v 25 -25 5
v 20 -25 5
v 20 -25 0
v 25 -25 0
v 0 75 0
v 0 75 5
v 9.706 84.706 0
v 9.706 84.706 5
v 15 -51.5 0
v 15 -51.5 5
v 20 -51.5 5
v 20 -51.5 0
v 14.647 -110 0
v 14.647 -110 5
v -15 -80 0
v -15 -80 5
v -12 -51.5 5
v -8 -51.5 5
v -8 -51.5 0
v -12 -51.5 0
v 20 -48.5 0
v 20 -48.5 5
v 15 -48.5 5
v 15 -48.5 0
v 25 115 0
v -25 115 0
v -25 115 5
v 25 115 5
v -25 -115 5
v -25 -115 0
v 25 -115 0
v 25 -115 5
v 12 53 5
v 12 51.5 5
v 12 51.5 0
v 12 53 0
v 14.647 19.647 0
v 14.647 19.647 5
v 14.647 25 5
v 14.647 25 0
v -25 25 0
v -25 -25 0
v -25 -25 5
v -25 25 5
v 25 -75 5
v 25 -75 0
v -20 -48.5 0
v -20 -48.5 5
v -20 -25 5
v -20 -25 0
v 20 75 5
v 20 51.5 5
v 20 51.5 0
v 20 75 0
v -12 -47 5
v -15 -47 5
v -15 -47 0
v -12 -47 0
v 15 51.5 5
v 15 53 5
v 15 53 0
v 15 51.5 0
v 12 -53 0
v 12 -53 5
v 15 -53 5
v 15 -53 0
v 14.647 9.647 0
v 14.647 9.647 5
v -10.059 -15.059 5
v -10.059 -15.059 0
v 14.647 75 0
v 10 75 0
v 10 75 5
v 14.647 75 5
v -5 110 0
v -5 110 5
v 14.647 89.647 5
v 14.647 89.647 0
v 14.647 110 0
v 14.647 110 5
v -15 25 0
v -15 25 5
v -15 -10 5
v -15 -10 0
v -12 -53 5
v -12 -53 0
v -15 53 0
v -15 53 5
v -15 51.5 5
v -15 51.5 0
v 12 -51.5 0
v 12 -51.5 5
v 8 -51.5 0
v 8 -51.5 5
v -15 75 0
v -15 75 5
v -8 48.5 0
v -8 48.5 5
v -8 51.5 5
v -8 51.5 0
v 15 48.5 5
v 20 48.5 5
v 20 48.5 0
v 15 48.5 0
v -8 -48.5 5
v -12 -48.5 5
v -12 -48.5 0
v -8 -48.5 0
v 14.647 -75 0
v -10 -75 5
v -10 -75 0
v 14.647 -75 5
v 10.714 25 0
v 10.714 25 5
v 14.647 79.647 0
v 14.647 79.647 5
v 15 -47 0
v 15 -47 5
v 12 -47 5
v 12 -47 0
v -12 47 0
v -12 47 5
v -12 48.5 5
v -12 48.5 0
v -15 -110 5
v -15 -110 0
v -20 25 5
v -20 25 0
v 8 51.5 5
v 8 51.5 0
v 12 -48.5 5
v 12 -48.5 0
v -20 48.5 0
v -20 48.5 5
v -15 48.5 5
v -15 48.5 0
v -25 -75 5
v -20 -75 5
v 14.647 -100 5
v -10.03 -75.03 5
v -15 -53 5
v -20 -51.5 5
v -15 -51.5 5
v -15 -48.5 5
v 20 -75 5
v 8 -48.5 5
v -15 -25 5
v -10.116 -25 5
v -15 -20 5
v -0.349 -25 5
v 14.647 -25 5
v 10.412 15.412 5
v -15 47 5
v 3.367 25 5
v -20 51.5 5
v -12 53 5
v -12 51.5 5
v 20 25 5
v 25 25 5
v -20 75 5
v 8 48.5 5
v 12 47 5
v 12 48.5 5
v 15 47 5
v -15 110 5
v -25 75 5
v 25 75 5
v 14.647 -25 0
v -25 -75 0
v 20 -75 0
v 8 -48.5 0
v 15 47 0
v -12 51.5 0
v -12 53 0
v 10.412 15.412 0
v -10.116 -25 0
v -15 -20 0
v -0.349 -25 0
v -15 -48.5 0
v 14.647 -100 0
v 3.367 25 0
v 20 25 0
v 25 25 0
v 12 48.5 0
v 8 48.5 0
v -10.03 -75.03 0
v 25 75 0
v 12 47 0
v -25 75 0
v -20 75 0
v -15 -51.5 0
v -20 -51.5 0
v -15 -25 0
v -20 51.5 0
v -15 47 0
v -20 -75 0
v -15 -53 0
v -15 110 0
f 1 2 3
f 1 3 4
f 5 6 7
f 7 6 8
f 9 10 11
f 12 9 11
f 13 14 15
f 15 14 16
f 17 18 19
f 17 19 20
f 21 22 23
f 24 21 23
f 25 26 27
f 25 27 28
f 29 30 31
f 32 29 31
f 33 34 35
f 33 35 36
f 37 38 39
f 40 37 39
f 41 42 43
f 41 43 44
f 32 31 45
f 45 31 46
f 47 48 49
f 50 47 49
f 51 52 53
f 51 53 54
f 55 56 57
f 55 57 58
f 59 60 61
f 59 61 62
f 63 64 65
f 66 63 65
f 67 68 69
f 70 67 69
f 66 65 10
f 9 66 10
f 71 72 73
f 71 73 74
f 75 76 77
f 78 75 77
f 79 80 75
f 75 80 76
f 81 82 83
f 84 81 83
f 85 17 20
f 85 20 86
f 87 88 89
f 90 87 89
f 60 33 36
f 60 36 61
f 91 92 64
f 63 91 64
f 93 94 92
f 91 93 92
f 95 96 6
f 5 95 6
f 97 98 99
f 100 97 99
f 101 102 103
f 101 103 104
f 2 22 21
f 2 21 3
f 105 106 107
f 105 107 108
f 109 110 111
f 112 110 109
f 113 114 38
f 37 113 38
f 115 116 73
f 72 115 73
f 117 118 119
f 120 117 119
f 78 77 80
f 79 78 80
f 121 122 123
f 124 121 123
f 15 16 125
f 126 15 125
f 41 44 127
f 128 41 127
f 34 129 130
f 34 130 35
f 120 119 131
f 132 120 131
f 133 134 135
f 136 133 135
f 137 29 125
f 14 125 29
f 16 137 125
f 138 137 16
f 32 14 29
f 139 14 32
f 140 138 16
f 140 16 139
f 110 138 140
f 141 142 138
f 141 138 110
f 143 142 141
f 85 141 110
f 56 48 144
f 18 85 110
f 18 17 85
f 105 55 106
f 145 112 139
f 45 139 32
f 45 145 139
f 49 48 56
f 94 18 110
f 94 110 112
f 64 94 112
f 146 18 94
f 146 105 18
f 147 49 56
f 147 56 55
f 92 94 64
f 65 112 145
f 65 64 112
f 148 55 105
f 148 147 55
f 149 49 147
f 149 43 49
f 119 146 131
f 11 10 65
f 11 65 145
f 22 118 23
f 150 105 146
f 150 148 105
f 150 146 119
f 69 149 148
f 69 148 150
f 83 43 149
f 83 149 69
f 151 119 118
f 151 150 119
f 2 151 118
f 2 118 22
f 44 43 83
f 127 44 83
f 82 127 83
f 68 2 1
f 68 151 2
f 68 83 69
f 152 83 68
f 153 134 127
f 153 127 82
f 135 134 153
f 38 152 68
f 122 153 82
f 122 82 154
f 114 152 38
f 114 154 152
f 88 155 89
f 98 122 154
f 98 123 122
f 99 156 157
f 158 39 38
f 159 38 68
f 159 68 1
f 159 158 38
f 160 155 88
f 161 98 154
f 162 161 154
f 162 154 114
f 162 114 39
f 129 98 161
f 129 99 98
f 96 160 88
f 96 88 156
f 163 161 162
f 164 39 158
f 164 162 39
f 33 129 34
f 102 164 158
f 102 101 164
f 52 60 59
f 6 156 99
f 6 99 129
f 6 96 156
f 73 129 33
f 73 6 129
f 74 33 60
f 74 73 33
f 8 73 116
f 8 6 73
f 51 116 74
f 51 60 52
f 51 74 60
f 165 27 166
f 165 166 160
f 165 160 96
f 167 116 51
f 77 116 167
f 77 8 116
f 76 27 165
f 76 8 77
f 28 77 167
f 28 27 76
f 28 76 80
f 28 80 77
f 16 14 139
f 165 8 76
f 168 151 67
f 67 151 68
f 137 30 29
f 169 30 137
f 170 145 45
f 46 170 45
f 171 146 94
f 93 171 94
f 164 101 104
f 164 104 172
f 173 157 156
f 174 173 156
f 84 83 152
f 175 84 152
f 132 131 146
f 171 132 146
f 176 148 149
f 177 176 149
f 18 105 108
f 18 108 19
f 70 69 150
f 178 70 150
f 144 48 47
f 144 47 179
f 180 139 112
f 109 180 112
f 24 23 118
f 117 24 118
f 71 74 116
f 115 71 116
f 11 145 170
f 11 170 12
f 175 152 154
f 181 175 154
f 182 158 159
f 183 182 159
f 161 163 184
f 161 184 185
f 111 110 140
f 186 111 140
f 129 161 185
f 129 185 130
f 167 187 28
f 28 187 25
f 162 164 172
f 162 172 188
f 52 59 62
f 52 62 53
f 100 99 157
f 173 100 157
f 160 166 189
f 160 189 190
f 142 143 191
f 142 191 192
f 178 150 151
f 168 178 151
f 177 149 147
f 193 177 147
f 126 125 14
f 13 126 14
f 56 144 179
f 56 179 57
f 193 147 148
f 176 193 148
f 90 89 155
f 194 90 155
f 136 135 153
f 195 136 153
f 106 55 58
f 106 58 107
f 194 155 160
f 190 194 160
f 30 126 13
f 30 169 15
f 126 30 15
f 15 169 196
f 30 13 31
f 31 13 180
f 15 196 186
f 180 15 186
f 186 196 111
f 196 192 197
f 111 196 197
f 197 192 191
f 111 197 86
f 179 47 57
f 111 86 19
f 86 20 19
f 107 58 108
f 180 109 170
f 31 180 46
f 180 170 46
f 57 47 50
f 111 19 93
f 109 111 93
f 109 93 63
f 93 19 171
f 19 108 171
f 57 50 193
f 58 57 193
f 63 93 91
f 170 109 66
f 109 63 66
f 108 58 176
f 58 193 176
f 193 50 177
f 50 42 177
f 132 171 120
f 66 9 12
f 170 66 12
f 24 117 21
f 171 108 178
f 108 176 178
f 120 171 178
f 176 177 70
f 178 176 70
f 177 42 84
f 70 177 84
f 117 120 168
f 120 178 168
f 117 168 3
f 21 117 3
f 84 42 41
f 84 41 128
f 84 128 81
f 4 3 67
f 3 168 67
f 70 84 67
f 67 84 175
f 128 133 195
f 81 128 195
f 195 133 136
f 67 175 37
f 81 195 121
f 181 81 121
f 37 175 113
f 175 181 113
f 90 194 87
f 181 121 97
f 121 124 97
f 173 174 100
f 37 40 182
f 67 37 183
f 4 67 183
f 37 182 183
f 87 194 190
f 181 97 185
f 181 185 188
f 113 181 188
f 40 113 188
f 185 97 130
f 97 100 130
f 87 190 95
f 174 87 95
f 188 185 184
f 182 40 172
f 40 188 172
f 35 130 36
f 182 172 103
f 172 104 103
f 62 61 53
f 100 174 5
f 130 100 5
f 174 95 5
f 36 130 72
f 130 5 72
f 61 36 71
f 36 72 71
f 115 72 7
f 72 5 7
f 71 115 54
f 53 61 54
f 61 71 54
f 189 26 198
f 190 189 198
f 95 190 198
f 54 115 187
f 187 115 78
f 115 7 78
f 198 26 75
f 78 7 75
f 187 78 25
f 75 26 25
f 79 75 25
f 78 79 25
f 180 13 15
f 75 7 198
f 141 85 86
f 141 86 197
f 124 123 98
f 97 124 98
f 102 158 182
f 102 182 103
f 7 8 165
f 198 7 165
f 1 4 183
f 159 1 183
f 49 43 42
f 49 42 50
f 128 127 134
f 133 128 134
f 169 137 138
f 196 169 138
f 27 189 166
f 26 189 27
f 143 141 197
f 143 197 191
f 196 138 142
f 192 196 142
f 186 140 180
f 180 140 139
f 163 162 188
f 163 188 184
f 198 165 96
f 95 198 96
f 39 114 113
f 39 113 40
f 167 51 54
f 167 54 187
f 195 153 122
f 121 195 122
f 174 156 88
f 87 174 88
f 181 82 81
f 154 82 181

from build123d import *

# Parameters (mm, degrees)
SKETCH1_W           = 50
SKETCH1_H           = 230
BOSS_EXTRUDE1_DEPTH = 5
SKETCH9_W           = 5
SKETCH9_H           = 50
CUT_EXTRUDE6_DEPTH  = 7
SKETCH10_R          = 1.5
CUT_EXTRUDE7_DEPTH  = 7
CUT_EXTRUDE8_START  = -7
SKETCH11_R          = 1.5
CUT_EXTRUDE8_DEPTH  = 7
CUT_EXTRUDE9_DEPTH  = 7
SKETCH13_W          = 40
SKETCH13_H          = 50
BOSS_EXTRUDE2_DEPTH = 5
CUT_EXTRUDE10_DEPTH = 5


with BuildPart() as part:
    # Sketch1 → Boss-Extrude1 (new body)
    with BuildSketch(Plane.XY):
        Rectangle(SKETCH1_W, SKETCH1_H)
    extrude(amount=BOSS_EXTRUDE1_DEPTH)

    # Sketch9 → Cut-Extrude6 (cut)
    with BuildSketch(Plane.XY.offset(5)):
        with Locations((-22.5, 50)):
            Rectangle(SKETCH9_W, SKETCH9_H)
        with Locations((-22.5, -50)):
            Rectangle(SKETCH9_W, SKETCH9_H)
        with Locations((22.5, -50)):
            Rectangle(SKETCH9_W, SKETCH9_H)
        with Locations((22.5, 50)):
            Rectangle(SKETCH9_W, SKETCH9_H)
    extrude(amount=-CUT_EXTRUDE6_DEPTH, mode=Mode.SUBTRACT)

    # Sketch10 → Cut-Extrude7 (cut)
    with BuildSketch(Plane.ZY.offset(20)):
        with Locations(Location((2.5, 50, 0), (0, 0, 270))):
            Circle(SKETCH10_R)
        with Locations(Location((2.5, -50, 0), (0, 0, 270))):
            Circle(SKETCH10_R)
    extrude(amount=-CUT_EXTRUDE7_DEPTH, mode=Mode.SUBTRACT)

    # Sketch11 → Cut-Extrude8 (cut)
    with BuildSketch(Plane(origin=(20, 0, 0), x_dir=(0, 0, -1), z_dir=(1, 0, 0)).offset(CUT_EXTRUDE8_START)):
        with Locations(Location((-2.5, -50, 0), (0, 0, 270))):
            Circle(SKETCH11_R)
        with Locations(Location((-2.5, 50, 0), (0, 0, 270))):
            Circle(SKETCH11_R)
    extrude(amount=CUT_EXTRUDE8_DEPTH, mode=Mode.SUBTRACT)

    # Sketch12 → Cut-Extrude9 (cut)
    with BuildSketch(Plane.XY.offset(5)):
        Polygon((9.705882353, 84.705882353), (-15, 110), (-15, 60), align=None)
        Polygon((14.647058824, 19.647058824), (14.647058824, 79.647058824), (-10.764705882, 54.235294118), align=None)
        Polygon((10.411764706, 15.411764706), (-15, 50), (-15, -10), align=None)
        Polygon((14.647058824, 110), (-5, 110), (14.647058824, 89.647058824), align=None)
        Polygon((14.647058824, -40.352941176), (14.647058824, 9.647058824), (-10.058823529, -15.058823529), align=None)
        Polygon((9.705882353, -45.294117647), (-15, -20), (-15, -70), align=None)
        Polygon((14.647058824, -100), (14.647058824, -50.352941176), (-10.029585799, -75.029585799), align=None)
        Polygon((14.647058824, -110), (-15, -80), (-15, -110), align=None)
    extrude(amount=-CUT_EXTRUDE9_DEPTH, mode=Mode.SUBTRACT)

    # Sketch13 → Boss-Extrude2 (add)
    with BuildSketch(Plane.XY.offset(5)):
        with Locations((0, -50)):
            Rectangle(SKETCH13_W, SKETCH13_H)
        with Locations((0, 50)):
            Rectangle(SKETCH13_W, SKETCH13_H)
    extrude(amount=-BOSS_EXTRUDE2_DEPTH)

    # Sketch14 → Cut-Extrude10 (cut)
    with BuildSketch(Plane.XY.offset(5)):
        Polygon((-15, -48.5), (-15, -47), (-12, -47), (-12, -48.5), (-8, -48.5), (-8, -51.5), (-12, -51.5), (-12, -53), (-15, -53), (-15, -51.5), (-20, -51.5), (-20, -48.5), align=None)
        Polygon((-20, 48.5), (-15, 48.5), (-15, 47), (-12, 47), (-12, 48.5), (-8, 48.5), (-8, 51.5), (-12, 51.5), (-12, 53), (-15, 53), (-15, 51.5), (-20, 51.5), align=None)
        Polygon((15, -48.5), (15, -47), (12, -47), (12, -48.5), (8, -48.5), (8, -51.5), (12, -51.5), (12, -53), (15, -53), (15, -51.5), (20, -51.5), (20, -48.5), align=None)
        Polygon((20, 48.5), (15, 48.5), (15, 47), (12, 47), (12, 48.5), (8, 48.5), (8, 51.5), (12, 51.5), (12, 53), (15, 53), (15, 51.5), (20, 51.5), align=None)
    extrude(amount=-CUT_EXTRUDE10_DEPTH, mode=Mode.SUBTRACT)


solid = part.part
